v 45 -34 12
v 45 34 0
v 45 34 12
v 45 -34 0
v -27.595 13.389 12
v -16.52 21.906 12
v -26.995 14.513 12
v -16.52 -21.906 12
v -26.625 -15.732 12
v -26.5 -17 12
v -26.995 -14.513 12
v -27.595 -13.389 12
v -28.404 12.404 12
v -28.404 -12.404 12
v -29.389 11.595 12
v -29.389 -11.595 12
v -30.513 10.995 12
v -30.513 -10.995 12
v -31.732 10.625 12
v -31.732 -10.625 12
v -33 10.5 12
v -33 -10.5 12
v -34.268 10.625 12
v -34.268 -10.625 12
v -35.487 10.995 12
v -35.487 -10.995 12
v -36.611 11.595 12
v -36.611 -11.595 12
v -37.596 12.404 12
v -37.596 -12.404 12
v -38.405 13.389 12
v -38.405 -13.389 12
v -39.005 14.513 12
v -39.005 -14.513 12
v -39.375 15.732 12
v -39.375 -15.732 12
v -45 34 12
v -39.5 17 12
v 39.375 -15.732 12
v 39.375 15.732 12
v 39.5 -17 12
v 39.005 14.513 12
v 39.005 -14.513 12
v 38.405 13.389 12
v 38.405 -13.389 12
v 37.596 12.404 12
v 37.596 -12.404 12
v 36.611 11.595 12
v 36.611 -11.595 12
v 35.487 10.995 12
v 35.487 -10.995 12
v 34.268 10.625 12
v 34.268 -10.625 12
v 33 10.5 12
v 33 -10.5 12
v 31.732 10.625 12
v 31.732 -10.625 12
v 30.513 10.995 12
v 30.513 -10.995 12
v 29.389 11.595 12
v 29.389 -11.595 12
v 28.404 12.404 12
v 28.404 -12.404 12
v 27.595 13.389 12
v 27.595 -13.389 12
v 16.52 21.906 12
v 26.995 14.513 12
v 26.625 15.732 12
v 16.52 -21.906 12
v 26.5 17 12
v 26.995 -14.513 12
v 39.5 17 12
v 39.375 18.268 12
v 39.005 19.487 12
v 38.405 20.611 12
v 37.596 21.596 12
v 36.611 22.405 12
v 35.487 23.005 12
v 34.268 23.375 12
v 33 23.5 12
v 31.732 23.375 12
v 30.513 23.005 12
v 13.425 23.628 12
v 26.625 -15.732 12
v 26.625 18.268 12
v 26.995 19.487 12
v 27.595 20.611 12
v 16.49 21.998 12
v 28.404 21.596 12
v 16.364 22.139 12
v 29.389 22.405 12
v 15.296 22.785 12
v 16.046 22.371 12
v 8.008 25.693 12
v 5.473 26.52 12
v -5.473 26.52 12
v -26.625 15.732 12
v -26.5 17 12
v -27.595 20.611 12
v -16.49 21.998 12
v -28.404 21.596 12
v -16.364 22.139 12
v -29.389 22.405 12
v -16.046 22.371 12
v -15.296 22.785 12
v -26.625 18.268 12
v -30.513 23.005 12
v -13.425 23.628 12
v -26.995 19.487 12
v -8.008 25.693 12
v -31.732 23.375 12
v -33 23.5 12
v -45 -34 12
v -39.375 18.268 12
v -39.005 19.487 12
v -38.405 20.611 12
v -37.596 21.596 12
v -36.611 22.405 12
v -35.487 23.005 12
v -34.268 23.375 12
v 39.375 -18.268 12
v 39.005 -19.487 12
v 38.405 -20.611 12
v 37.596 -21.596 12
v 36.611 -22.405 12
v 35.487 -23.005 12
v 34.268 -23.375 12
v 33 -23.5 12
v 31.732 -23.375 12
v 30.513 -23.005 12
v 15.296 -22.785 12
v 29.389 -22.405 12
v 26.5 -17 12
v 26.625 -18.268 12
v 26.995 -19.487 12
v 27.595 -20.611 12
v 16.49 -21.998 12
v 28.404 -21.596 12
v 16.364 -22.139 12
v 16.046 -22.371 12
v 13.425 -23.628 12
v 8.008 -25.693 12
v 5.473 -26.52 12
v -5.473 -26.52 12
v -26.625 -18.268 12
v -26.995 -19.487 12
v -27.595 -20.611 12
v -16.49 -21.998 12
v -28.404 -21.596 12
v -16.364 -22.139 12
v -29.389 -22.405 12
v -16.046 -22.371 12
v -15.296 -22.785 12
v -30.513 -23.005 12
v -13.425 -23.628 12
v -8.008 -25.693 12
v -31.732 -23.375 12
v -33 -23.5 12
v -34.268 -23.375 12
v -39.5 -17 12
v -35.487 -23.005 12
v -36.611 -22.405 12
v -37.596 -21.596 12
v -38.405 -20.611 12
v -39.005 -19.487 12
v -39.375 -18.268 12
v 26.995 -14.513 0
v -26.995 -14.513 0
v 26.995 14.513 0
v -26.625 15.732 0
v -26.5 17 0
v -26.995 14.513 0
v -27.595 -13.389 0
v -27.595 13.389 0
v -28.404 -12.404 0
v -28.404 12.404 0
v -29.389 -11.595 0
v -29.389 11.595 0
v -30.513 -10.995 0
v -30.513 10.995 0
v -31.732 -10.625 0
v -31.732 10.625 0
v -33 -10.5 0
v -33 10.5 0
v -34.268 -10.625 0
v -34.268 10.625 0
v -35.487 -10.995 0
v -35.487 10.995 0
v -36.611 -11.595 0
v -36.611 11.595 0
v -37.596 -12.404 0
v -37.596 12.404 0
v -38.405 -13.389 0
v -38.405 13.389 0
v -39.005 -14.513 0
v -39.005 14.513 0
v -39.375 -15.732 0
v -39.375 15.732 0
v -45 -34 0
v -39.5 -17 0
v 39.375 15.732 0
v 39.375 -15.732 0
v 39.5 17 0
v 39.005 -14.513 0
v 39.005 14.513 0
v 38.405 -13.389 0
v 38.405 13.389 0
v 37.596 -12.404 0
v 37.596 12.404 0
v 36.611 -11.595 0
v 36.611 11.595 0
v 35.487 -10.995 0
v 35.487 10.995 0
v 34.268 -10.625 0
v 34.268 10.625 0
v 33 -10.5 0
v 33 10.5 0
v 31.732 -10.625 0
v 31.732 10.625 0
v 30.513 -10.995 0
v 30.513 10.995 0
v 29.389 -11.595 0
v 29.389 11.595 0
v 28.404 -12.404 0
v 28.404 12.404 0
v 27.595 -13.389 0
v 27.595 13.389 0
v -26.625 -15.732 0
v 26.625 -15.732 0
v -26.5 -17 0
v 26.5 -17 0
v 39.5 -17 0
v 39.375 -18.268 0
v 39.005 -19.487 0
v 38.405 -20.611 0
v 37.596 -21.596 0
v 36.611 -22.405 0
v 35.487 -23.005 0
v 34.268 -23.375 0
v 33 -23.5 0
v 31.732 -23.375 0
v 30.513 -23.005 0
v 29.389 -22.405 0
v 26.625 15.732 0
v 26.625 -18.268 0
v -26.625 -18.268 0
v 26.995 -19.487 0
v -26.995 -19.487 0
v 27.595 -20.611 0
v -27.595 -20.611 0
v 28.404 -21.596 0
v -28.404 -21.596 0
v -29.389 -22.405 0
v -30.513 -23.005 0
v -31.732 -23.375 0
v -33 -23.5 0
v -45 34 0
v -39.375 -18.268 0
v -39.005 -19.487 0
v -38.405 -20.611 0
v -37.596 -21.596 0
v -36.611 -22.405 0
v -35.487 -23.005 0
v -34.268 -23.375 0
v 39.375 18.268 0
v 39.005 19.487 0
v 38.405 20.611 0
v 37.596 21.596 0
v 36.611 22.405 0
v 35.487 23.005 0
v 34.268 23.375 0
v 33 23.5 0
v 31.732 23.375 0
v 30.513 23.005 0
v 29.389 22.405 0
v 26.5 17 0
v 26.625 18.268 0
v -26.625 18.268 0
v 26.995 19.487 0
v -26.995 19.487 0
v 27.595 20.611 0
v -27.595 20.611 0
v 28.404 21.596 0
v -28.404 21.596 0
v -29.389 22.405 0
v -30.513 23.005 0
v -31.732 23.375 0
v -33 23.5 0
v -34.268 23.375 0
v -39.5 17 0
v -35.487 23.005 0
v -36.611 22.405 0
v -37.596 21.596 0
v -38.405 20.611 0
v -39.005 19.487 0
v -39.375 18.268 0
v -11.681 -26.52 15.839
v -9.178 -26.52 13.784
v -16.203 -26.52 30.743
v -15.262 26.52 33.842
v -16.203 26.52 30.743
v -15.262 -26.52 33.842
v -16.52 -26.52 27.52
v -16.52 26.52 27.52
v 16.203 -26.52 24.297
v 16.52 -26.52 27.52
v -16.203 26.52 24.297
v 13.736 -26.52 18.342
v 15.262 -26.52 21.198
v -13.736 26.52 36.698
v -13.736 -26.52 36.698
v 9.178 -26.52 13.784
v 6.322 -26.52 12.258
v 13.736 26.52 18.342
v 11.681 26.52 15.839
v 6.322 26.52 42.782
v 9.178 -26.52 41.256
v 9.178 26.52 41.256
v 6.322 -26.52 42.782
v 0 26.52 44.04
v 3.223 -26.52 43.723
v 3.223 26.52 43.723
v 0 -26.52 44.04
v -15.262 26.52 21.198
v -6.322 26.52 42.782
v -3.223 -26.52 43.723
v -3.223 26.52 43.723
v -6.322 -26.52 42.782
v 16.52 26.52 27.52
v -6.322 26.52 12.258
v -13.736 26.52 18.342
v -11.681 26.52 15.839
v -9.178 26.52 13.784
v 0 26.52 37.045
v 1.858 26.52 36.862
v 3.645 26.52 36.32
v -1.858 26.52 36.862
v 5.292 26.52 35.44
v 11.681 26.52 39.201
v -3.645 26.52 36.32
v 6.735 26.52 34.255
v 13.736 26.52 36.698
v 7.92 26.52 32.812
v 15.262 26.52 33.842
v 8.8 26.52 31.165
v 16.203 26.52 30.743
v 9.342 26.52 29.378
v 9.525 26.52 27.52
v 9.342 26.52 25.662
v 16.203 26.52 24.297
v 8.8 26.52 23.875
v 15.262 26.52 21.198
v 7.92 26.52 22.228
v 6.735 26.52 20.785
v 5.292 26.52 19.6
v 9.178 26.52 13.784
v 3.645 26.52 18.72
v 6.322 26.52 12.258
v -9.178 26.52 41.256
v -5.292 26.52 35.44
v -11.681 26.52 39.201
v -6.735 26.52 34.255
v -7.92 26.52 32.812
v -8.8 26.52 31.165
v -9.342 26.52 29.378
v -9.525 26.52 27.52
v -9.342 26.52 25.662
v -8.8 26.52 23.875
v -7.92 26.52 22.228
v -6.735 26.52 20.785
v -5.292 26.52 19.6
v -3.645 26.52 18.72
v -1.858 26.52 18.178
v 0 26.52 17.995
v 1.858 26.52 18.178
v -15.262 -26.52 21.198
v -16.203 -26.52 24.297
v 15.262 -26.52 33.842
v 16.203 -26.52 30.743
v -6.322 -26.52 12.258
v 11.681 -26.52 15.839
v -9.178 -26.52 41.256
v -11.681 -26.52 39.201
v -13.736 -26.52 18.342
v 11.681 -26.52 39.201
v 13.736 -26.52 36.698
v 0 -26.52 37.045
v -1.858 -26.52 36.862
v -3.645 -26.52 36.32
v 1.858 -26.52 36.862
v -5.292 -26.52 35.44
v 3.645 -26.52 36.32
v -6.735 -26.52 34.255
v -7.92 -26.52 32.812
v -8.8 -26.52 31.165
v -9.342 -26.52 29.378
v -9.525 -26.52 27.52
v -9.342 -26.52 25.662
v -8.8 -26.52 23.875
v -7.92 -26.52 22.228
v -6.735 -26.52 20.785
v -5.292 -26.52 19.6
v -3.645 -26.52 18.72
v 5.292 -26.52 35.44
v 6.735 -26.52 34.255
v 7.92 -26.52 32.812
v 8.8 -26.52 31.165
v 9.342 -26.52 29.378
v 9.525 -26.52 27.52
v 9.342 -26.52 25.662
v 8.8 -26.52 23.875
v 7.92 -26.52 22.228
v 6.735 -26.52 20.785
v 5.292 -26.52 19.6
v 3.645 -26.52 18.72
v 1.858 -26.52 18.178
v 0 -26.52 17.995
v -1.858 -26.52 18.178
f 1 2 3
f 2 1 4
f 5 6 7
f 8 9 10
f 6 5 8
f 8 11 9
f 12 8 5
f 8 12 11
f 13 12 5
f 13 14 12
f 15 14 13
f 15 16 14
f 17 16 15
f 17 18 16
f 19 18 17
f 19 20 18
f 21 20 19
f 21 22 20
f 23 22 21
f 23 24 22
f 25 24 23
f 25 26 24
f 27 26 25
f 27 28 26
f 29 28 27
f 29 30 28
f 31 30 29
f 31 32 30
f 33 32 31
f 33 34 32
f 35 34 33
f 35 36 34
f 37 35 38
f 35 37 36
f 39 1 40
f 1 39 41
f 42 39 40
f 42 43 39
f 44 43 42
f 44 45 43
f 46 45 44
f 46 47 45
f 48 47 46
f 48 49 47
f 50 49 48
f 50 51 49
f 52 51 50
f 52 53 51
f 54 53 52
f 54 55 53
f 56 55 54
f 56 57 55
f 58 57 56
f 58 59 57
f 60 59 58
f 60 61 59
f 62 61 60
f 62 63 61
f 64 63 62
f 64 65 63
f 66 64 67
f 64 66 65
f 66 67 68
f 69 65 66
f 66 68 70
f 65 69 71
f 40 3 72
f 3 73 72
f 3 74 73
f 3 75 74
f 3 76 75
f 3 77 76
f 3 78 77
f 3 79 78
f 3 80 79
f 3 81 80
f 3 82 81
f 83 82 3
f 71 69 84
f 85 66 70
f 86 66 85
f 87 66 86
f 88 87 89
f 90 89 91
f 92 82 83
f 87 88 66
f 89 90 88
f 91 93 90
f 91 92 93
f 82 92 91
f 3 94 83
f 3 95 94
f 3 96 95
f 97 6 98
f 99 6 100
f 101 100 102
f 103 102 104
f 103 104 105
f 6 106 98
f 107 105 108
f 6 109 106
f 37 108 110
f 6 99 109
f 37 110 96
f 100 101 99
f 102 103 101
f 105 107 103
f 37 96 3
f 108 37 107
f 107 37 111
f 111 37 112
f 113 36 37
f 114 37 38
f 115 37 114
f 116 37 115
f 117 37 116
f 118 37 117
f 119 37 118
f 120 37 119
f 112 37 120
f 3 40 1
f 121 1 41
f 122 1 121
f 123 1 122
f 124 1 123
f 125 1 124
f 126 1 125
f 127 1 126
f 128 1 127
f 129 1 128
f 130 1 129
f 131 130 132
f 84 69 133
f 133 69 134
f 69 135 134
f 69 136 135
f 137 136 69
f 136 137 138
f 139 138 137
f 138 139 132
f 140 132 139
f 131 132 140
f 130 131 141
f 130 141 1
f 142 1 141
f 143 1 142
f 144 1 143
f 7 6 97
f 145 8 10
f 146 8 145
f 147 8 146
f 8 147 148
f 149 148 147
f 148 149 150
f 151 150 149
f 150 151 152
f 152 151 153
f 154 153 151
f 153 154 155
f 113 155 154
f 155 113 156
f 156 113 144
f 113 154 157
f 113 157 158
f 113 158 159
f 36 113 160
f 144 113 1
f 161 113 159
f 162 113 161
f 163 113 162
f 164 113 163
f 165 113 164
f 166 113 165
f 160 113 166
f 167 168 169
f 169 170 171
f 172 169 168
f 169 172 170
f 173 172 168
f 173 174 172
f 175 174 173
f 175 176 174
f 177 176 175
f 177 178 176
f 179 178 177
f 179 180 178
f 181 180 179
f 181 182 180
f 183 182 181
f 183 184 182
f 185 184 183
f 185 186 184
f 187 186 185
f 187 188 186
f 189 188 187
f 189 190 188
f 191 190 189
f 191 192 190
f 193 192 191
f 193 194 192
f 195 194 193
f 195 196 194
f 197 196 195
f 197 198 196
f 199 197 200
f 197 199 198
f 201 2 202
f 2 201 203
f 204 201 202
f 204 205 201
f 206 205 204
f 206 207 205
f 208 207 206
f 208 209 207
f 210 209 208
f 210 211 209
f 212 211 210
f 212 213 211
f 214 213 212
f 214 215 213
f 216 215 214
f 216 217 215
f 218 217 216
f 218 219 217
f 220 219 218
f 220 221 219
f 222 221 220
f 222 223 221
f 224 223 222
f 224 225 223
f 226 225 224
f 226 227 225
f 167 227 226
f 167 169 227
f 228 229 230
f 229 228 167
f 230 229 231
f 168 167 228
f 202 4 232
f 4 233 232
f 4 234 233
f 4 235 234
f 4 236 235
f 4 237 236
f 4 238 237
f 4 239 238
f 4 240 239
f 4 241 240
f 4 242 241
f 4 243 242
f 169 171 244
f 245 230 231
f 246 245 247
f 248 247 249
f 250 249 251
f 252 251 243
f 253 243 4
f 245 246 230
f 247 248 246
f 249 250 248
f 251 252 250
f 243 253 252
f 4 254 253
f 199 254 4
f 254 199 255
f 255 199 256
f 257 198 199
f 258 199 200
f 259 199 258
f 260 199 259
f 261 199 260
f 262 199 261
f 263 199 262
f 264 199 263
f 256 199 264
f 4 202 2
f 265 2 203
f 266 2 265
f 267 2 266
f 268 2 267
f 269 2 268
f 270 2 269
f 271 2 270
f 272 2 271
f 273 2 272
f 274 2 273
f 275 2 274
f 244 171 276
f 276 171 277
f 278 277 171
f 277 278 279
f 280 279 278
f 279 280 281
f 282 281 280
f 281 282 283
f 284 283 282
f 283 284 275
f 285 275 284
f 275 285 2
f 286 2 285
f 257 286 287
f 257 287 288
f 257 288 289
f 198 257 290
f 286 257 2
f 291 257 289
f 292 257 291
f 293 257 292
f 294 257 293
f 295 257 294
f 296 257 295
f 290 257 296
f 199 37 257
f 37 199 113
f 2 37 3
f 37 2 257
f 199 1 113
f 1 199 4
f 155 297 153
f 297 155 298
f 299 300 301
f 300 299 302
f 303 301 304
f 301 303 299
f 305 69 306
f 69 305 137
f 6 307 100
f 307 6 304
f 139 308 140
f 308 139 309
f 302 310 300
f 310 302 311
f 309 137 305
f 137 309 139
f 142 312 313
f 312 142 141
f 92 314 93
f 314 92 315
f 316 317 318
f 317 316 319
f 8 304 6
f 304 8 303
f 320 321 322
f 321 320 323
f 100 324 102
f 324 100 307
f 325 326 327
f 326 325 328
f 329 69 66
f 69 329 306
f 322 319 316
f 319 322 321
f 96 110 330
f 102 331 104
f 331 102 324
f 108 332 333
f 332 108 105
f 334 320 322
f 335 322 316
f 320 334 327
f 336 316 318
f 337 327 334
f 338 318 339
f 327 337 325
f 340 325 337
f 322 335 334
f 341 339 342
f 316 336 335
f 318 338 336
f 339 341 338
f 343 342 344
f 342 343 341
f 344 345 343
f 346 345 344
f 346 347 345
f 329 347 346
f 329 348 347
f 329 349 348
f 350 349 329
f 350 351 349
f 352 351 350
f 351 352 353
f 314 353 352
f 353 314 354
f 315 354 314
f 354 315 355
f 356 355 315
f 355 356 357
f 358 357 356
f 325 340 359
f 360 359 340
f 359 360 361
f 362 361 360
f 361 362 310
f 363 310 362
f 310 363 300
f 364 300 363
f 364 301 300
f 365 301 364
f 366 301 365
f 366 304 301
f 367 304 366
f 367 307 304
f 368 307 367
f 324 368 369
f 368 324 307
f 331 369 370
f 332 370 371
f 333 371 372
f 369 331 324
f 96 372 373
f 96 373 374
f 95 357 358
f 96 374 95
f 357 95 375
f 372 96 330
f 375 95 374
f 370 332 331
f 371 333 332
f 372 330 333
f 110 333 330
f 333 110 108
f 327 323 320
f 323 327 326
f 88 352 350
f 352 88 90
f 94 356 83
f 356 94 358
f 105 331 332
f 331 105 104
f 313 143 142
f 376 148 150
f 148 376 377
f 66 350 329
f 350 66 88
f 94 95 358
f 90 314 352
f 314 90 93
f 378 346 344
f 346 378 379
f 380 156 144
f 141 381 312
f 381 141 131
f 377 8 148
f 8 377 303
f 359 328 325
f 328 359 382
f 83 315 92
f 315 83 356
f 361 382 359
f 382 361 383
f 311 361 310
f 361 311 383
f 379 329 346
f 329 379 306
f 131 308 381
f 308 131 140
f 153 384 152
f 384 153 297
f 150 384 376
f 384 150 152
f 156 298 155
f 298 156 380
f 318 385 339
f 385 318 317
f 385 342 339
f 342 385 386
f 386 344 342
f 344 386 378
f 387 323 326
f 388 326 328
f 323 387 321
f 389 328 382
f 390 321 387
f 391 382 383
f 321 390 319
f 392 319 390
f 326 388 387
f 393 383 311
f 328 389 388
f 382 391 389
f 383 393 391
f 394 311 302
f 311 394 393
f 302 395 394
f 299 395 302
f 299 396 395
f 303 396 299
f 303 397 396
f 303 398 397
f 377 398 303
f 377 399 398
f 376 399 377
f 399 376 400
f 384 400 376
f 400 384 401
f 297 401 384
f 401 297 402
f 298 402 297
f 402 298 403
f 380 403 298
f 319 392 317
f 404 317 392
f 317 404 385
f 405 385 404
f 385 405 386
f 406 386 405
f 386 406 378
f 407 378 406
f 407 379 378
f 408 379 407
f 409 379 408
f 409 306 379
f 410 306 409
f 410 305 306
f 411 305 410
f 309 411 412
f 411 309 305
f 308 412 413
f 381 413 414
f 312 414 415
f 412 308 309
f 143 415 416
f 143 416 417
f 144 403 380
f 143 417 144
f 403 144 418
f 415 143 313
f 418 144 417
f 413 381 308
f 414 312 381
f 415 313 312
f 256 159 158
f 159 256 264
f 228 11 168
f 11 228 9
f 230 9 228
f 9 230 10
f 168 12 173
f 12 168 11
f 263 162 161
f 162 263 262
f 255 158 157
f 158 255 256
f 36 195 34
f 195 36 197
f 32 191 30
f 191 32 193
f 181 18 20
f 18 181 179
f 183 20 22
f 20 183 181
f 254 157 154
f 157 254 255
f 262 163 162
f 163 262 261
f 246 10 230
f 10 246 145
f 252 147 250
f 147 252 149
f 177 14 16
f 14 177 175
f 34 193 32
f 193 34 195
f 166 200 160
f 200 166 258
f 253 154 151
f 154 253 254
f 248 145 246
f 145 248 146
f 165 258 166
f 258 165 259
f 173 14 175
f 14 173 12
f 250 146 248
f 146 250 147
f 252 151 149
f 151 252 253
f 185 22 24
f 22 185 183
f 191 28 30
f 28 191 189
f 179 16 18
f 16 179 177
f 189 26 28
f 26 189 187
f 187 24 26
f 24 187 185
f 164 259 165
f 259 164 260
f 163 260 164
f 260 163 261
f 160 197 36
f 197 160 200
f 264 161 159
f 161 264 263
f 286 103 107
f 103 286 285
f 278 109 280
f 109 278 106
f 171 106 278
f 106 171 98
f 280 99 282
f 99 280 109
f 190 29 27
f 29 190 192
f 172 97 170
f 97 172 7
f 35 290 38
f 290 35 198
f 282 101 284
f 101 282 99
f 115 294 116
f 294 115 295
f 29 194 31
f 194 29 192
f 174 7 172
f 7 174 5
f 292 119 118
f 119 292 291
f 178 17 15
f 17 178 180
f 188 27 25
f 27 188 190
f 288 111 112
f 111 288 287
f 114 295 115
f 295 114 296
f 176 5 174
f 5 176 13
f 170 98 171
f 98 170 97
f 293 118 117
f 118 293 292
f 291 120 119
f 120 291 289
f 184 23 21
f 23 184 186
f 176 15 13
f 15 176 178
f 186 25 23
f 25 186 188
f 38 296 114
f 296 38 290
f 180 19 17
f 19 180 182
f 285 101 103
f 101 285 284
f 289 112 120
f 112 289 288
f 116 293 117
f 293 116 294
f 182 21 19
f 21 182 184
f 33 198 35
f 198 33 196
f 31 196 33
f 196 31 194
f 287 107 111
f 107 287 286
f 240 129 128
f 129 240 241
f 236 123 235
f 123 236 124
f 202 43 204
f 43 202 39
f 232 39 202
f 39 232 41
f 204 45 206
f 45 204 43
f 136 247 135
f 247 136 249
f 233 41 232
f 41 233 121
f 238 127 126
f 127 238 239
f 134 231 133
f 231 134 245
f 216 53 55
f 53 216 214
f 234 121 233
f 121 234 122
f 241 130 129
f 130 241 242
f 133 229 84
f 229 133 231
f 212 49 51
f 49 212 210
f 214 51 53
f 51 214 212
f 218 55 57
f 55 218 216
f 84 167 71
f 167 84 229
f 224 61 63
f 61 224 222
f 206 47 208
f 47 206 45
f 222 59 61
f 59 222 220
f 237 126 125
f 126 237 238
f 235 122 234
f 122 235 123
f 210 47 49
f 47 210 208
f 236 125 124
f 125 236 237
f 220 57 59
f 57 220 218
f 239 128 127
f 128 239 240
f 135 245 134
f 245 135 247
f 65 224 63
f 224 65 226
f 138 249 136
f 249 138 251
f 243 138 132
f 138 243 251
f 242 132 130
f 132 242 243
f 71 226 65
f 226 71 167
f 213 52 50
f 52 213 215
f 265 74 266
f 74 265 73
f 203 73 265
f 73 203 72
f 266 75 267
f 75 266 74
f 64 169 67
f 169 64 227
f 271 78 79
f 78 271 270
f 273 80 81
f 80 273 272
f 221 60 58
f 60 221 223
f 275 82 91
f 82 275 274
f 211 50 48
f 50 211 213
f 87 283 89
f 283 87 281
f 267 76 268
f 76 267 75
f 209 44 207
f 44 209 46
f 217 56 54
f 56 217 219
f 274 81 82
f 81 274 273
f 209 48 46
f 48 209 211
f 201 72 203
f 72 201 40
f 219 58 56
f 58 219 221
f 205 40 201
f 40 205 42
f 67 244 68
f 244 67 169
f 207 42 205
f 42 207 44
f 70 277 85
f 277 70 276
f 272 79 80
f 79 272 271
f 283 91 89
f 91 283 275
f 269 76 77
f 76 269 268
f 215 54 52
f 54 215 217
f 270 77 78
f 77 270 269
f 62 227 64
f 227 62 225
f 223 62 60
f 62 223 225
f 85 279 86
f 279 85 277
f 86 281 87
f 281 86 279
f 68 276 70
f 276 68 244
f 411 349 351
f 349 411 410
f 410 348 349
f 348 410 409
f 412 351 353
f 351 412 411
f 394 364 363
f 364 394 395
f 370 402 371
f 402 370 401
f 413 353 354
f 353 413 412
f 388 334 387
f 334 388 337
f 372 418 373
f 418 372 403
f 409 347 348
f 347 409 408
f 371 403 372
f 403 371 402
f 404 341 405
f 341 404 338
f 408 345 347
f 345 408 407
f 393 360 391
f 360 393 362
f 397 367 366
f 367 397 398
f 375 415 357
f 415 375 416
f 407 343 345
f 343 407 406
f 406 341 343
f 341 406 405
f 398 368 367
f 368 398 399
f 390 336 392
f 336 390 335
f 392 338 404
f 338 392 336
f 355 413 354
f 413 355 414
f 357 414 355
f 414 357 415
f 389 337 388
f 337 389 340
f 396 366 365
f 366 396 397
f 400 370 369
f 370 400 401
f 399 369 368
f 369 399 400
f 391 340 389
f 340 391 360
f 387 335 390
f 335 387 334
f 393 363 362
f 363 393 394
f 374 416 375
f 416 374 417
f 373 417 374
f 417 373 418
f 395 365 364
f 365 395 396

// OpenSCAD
$fn = 32;

// ----------------------------------------------------------------------
// Bearing block: 90 x 68 mm base, 19.05 mm bore at 27.52 mm
// ----------------------------------------------------------------------

// --- parameters (mm) ---
base_w = 90;              // base width
base_d = 68;              // base depth
base_t = 12;              // base thickness
bore_d = 19.05;           // shaft / bearing bore
house_r = 16.52;          // housing outer radius
house_len = 53.04;        // housing length along the shaft
foot_w = 33.04;           // foot width under the housing
foot_len = 43.04;         // foot length along the shaft
axis_z = 27.52;           // bore axis height above the base
holes_d = 13;             // mounting holes
hole_x = 33;              // mounting hole spacing

difference() {
  union() {
    /* base plate with its underside on z = 0 */
    translate([0, 0, base_t / 2]) cube([base_w, base_d, base_t], center = true);
    /* hull foot: a straight web blending into the round housing */
    hull() {
      translate([0, 0, base_t - 0.5]) cube([foot_w, foot_len, 1.6], center = true);
      translate([0, 0, axis_z]) rotate([-90, 0, 0]) cylinder(h = house_len, d = 2 * house_r, center = true);
    }
  }
  /* bore through the housing, 2.5 mm clear on both sides */
  translate([0, 0, axis_z]) rotate([-90, 0, 0]) cylinder(h = house_len + 5, d = bore_d, center = true);
  /* mounting holes through the base plate */
  for (hx = [-33, 33]) {
    for (hy = [-17, 17]) {
      translate([hx, hy, -2.5]) cylinder(h = base_t + 5, d = holes_d);
    }
  }
}
